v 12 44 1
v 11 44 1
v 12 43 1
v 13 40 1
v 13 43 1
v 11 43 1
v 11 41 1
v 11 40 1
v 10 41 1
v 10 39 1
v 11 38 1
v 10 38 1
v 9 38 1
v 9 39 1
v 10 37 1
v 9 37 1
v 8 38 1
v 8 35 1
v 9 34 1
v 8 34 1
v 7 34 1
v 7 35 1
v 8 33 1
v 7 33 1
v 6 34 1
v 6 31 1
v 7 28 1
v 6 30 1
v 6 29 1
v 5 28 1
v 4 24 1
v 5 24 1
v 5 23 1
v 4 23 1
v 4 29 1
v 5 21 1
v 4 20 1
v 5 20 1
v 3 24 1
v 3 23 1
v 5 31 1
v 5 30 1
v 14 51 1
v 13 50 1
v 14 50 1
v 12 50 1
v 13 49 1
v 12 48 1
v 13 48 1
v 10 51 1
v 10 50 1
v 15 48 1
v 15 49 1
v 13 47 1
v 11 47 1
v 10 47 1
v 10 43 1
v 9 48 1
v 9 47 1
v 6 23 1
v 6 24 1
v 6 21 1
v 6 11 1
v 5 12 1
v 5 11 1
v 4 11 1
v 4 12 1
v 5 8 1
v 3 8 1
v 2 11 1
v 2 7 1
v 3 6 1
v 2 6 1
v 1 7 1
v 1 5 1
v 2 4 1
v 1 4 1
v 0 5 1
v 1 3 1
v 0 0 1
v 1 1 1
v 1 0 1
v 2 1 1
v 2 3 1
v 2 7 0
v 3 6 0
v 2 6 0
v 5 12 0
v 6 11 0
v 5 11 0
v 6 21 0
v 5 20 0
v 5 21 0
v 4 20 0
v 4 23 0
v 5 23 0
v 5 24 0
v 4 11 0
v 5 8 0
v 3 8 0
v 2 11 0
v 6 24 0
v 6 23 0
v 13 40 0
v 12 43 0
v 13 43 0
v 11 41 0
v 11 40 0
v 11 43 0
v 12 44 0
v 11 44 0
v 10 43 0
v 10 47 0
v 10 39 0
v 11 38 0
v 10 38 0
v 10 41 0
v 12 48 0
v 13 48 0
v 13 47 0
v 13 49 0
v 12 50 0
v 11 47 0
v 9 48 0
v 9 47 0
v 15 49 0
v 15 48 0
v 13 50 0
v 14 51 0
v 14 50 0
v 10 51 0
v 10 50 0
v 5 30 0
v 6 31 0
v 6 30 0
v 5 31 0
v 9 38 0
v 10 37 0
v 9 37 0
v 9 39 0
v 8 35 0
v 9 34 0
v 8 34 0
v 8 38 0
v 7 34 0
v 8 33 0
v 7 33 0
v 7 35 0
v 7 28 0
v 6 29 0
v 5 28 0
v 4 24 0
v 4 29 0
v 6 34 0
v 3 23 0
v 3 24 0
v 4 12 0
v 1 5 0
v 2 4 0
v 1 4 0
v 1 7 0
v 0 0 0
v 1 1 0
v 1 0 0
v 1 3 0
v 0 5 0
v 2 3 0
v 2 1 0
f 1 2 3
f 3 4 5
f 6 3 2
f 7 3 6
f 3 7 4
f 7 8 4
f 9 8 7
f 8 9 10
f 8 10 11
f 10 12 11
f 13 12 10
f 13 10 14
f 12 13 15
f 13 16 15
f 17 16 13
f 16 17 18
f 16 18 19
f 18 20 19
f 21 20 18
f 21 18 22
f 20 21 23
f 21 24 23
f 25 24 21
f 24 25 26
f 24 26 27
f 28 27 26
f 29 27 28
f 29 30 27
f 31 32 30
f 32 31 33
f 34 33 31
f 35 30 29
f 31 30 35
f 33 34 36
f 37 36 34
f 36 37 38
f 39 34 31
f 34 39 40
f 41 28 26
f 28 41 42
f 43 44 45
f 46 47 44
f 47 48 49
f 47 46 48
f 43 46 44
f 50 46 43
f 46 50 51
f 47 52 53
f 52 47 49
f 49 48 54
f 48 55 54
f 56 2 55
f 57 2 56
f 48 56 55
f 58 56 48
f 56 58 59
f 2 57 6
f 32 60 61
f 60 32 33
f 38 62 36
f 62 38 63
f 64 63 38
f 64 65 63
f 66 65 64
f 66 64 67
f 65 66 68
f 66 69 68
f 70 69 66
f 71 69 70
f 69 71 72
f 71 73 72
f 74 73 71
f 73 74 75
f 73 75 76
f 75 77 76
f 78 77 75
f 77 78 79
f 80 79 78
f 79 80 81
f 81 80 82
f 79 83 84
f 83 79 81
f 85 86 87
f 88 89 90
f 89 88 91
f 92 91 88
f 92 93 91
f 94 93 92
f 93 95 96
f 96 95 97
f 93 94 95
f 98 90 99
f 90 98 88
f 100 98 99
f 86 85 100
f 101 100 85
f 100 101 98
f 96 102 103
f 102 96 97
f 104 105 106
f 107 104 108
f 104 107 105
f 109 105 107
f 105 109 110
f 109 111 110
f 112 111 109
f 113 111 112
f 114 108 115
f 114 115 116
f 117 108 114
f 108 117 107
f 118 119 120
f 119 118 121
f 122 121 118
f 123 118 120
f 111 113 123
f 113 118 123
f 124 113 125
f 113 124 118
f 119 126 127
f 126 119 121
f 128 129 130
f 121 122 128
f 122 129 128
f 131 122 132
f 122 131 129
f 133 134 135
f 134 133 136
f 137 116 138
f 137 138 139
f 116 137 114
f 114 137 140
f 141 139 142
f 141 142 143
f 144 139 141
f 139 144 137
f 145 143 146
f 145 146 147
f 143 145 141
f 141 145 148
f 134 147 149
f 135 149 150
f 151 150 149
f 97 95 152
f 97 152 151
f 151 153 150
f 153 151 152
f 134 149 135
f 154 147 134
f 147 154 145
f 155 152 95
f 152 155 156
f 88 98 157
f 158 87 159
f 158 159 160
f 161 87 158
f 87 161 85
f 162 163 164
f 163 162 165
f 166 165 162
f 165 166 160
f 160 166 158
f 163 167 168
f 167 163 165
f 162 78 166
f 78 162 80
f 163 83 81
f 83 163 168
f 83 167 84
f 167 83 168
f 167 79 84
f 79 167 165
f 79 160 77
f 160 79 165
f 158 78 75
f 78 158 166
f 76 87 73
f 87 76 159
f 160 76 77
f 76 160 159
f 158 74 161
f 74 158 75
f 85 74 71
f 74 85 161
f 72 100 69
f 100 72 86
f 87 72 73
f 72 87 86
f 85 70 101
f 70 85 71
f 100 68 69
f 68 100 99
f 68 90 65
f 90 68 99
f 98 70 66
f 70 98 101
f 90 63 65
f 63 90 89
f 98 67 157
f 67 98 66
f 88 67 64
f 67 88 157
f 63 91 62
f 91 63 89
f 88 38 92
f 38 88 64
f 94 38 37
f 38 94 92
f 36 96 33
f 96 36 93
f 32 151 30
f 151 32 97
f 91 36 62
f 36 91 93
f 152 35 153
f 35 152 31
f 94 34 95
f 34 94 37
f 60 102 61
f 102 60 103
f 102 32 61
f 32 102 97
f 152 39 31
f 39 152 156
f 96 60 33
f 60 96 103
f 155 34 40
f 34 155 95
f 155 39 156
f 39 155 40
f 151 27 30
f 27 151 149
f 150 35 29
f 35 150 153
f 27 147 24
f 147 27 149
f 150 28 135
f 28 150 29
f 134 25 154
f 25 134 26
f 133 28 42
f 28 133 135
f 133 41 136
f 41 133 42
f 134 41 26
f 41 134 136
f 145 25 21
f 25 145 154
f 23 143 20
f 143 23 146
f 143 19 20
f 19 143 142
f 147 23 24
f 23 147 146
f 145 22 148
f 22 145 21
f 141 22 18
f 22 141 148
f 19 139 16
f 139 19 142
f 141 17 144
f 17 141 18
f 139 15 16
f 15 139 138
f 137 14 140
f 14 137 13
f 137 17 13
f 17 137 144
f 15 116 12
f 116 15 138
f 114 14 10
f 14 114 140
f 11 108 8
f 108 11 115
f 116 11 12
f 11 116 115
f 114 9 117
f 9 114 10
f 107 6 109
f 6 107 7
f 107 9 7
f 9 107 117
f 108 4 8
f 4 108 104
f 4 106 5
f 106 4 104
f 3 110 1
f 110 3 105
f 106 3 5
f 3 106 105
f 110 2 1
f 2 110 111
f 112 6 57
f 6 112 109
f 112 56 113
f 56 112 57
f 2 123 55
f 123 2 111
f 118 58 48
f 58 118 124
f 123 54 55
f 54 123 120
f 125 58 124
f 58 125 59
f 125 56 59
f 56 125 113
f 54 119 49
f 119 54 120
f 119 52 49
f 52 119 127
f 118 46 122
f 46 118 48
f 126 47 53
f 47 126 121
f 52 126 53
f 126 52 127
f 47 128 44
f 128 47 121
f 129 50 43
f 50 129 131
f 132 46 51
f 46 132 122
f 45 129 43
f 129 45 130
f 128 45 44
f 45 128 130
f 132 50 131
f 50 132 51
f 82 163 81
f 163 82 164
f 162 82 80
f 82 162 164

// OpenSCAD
cantidad = 100;
direction = rands(0,4,cantidad);

//vamos a dibujar un camino

translate([0,0,0])cube(1);

function calcx(vector, pos) = pos == -1?0:
    vector[pos] >3? calcx(vector,pos-1)+1:vector[pos] >2?calcx(vector,pos-1)-1:calcx(vector,pos-1);
 
 function calcy(vector, pos) = pos == -1?0:
    vector[pos] <2? calcy(vector,pos-1)+1:vector[pos] <1?calcy(vector,pos-1)-1:calcy(vector,pos-1);



for  (i = [0:cantidad-1])
{ 
        echo("i:");
        echo(i);
        echo("direccion");
        echo(direction[i]);
        echo("x:");
        echo(calcx(direction,i));
        echo("y:");
        echo(calcy(direction,i));
        echo("-----");
        translate([calcx(direction,i),calcy(direction,i),0])cube(1);    
}
